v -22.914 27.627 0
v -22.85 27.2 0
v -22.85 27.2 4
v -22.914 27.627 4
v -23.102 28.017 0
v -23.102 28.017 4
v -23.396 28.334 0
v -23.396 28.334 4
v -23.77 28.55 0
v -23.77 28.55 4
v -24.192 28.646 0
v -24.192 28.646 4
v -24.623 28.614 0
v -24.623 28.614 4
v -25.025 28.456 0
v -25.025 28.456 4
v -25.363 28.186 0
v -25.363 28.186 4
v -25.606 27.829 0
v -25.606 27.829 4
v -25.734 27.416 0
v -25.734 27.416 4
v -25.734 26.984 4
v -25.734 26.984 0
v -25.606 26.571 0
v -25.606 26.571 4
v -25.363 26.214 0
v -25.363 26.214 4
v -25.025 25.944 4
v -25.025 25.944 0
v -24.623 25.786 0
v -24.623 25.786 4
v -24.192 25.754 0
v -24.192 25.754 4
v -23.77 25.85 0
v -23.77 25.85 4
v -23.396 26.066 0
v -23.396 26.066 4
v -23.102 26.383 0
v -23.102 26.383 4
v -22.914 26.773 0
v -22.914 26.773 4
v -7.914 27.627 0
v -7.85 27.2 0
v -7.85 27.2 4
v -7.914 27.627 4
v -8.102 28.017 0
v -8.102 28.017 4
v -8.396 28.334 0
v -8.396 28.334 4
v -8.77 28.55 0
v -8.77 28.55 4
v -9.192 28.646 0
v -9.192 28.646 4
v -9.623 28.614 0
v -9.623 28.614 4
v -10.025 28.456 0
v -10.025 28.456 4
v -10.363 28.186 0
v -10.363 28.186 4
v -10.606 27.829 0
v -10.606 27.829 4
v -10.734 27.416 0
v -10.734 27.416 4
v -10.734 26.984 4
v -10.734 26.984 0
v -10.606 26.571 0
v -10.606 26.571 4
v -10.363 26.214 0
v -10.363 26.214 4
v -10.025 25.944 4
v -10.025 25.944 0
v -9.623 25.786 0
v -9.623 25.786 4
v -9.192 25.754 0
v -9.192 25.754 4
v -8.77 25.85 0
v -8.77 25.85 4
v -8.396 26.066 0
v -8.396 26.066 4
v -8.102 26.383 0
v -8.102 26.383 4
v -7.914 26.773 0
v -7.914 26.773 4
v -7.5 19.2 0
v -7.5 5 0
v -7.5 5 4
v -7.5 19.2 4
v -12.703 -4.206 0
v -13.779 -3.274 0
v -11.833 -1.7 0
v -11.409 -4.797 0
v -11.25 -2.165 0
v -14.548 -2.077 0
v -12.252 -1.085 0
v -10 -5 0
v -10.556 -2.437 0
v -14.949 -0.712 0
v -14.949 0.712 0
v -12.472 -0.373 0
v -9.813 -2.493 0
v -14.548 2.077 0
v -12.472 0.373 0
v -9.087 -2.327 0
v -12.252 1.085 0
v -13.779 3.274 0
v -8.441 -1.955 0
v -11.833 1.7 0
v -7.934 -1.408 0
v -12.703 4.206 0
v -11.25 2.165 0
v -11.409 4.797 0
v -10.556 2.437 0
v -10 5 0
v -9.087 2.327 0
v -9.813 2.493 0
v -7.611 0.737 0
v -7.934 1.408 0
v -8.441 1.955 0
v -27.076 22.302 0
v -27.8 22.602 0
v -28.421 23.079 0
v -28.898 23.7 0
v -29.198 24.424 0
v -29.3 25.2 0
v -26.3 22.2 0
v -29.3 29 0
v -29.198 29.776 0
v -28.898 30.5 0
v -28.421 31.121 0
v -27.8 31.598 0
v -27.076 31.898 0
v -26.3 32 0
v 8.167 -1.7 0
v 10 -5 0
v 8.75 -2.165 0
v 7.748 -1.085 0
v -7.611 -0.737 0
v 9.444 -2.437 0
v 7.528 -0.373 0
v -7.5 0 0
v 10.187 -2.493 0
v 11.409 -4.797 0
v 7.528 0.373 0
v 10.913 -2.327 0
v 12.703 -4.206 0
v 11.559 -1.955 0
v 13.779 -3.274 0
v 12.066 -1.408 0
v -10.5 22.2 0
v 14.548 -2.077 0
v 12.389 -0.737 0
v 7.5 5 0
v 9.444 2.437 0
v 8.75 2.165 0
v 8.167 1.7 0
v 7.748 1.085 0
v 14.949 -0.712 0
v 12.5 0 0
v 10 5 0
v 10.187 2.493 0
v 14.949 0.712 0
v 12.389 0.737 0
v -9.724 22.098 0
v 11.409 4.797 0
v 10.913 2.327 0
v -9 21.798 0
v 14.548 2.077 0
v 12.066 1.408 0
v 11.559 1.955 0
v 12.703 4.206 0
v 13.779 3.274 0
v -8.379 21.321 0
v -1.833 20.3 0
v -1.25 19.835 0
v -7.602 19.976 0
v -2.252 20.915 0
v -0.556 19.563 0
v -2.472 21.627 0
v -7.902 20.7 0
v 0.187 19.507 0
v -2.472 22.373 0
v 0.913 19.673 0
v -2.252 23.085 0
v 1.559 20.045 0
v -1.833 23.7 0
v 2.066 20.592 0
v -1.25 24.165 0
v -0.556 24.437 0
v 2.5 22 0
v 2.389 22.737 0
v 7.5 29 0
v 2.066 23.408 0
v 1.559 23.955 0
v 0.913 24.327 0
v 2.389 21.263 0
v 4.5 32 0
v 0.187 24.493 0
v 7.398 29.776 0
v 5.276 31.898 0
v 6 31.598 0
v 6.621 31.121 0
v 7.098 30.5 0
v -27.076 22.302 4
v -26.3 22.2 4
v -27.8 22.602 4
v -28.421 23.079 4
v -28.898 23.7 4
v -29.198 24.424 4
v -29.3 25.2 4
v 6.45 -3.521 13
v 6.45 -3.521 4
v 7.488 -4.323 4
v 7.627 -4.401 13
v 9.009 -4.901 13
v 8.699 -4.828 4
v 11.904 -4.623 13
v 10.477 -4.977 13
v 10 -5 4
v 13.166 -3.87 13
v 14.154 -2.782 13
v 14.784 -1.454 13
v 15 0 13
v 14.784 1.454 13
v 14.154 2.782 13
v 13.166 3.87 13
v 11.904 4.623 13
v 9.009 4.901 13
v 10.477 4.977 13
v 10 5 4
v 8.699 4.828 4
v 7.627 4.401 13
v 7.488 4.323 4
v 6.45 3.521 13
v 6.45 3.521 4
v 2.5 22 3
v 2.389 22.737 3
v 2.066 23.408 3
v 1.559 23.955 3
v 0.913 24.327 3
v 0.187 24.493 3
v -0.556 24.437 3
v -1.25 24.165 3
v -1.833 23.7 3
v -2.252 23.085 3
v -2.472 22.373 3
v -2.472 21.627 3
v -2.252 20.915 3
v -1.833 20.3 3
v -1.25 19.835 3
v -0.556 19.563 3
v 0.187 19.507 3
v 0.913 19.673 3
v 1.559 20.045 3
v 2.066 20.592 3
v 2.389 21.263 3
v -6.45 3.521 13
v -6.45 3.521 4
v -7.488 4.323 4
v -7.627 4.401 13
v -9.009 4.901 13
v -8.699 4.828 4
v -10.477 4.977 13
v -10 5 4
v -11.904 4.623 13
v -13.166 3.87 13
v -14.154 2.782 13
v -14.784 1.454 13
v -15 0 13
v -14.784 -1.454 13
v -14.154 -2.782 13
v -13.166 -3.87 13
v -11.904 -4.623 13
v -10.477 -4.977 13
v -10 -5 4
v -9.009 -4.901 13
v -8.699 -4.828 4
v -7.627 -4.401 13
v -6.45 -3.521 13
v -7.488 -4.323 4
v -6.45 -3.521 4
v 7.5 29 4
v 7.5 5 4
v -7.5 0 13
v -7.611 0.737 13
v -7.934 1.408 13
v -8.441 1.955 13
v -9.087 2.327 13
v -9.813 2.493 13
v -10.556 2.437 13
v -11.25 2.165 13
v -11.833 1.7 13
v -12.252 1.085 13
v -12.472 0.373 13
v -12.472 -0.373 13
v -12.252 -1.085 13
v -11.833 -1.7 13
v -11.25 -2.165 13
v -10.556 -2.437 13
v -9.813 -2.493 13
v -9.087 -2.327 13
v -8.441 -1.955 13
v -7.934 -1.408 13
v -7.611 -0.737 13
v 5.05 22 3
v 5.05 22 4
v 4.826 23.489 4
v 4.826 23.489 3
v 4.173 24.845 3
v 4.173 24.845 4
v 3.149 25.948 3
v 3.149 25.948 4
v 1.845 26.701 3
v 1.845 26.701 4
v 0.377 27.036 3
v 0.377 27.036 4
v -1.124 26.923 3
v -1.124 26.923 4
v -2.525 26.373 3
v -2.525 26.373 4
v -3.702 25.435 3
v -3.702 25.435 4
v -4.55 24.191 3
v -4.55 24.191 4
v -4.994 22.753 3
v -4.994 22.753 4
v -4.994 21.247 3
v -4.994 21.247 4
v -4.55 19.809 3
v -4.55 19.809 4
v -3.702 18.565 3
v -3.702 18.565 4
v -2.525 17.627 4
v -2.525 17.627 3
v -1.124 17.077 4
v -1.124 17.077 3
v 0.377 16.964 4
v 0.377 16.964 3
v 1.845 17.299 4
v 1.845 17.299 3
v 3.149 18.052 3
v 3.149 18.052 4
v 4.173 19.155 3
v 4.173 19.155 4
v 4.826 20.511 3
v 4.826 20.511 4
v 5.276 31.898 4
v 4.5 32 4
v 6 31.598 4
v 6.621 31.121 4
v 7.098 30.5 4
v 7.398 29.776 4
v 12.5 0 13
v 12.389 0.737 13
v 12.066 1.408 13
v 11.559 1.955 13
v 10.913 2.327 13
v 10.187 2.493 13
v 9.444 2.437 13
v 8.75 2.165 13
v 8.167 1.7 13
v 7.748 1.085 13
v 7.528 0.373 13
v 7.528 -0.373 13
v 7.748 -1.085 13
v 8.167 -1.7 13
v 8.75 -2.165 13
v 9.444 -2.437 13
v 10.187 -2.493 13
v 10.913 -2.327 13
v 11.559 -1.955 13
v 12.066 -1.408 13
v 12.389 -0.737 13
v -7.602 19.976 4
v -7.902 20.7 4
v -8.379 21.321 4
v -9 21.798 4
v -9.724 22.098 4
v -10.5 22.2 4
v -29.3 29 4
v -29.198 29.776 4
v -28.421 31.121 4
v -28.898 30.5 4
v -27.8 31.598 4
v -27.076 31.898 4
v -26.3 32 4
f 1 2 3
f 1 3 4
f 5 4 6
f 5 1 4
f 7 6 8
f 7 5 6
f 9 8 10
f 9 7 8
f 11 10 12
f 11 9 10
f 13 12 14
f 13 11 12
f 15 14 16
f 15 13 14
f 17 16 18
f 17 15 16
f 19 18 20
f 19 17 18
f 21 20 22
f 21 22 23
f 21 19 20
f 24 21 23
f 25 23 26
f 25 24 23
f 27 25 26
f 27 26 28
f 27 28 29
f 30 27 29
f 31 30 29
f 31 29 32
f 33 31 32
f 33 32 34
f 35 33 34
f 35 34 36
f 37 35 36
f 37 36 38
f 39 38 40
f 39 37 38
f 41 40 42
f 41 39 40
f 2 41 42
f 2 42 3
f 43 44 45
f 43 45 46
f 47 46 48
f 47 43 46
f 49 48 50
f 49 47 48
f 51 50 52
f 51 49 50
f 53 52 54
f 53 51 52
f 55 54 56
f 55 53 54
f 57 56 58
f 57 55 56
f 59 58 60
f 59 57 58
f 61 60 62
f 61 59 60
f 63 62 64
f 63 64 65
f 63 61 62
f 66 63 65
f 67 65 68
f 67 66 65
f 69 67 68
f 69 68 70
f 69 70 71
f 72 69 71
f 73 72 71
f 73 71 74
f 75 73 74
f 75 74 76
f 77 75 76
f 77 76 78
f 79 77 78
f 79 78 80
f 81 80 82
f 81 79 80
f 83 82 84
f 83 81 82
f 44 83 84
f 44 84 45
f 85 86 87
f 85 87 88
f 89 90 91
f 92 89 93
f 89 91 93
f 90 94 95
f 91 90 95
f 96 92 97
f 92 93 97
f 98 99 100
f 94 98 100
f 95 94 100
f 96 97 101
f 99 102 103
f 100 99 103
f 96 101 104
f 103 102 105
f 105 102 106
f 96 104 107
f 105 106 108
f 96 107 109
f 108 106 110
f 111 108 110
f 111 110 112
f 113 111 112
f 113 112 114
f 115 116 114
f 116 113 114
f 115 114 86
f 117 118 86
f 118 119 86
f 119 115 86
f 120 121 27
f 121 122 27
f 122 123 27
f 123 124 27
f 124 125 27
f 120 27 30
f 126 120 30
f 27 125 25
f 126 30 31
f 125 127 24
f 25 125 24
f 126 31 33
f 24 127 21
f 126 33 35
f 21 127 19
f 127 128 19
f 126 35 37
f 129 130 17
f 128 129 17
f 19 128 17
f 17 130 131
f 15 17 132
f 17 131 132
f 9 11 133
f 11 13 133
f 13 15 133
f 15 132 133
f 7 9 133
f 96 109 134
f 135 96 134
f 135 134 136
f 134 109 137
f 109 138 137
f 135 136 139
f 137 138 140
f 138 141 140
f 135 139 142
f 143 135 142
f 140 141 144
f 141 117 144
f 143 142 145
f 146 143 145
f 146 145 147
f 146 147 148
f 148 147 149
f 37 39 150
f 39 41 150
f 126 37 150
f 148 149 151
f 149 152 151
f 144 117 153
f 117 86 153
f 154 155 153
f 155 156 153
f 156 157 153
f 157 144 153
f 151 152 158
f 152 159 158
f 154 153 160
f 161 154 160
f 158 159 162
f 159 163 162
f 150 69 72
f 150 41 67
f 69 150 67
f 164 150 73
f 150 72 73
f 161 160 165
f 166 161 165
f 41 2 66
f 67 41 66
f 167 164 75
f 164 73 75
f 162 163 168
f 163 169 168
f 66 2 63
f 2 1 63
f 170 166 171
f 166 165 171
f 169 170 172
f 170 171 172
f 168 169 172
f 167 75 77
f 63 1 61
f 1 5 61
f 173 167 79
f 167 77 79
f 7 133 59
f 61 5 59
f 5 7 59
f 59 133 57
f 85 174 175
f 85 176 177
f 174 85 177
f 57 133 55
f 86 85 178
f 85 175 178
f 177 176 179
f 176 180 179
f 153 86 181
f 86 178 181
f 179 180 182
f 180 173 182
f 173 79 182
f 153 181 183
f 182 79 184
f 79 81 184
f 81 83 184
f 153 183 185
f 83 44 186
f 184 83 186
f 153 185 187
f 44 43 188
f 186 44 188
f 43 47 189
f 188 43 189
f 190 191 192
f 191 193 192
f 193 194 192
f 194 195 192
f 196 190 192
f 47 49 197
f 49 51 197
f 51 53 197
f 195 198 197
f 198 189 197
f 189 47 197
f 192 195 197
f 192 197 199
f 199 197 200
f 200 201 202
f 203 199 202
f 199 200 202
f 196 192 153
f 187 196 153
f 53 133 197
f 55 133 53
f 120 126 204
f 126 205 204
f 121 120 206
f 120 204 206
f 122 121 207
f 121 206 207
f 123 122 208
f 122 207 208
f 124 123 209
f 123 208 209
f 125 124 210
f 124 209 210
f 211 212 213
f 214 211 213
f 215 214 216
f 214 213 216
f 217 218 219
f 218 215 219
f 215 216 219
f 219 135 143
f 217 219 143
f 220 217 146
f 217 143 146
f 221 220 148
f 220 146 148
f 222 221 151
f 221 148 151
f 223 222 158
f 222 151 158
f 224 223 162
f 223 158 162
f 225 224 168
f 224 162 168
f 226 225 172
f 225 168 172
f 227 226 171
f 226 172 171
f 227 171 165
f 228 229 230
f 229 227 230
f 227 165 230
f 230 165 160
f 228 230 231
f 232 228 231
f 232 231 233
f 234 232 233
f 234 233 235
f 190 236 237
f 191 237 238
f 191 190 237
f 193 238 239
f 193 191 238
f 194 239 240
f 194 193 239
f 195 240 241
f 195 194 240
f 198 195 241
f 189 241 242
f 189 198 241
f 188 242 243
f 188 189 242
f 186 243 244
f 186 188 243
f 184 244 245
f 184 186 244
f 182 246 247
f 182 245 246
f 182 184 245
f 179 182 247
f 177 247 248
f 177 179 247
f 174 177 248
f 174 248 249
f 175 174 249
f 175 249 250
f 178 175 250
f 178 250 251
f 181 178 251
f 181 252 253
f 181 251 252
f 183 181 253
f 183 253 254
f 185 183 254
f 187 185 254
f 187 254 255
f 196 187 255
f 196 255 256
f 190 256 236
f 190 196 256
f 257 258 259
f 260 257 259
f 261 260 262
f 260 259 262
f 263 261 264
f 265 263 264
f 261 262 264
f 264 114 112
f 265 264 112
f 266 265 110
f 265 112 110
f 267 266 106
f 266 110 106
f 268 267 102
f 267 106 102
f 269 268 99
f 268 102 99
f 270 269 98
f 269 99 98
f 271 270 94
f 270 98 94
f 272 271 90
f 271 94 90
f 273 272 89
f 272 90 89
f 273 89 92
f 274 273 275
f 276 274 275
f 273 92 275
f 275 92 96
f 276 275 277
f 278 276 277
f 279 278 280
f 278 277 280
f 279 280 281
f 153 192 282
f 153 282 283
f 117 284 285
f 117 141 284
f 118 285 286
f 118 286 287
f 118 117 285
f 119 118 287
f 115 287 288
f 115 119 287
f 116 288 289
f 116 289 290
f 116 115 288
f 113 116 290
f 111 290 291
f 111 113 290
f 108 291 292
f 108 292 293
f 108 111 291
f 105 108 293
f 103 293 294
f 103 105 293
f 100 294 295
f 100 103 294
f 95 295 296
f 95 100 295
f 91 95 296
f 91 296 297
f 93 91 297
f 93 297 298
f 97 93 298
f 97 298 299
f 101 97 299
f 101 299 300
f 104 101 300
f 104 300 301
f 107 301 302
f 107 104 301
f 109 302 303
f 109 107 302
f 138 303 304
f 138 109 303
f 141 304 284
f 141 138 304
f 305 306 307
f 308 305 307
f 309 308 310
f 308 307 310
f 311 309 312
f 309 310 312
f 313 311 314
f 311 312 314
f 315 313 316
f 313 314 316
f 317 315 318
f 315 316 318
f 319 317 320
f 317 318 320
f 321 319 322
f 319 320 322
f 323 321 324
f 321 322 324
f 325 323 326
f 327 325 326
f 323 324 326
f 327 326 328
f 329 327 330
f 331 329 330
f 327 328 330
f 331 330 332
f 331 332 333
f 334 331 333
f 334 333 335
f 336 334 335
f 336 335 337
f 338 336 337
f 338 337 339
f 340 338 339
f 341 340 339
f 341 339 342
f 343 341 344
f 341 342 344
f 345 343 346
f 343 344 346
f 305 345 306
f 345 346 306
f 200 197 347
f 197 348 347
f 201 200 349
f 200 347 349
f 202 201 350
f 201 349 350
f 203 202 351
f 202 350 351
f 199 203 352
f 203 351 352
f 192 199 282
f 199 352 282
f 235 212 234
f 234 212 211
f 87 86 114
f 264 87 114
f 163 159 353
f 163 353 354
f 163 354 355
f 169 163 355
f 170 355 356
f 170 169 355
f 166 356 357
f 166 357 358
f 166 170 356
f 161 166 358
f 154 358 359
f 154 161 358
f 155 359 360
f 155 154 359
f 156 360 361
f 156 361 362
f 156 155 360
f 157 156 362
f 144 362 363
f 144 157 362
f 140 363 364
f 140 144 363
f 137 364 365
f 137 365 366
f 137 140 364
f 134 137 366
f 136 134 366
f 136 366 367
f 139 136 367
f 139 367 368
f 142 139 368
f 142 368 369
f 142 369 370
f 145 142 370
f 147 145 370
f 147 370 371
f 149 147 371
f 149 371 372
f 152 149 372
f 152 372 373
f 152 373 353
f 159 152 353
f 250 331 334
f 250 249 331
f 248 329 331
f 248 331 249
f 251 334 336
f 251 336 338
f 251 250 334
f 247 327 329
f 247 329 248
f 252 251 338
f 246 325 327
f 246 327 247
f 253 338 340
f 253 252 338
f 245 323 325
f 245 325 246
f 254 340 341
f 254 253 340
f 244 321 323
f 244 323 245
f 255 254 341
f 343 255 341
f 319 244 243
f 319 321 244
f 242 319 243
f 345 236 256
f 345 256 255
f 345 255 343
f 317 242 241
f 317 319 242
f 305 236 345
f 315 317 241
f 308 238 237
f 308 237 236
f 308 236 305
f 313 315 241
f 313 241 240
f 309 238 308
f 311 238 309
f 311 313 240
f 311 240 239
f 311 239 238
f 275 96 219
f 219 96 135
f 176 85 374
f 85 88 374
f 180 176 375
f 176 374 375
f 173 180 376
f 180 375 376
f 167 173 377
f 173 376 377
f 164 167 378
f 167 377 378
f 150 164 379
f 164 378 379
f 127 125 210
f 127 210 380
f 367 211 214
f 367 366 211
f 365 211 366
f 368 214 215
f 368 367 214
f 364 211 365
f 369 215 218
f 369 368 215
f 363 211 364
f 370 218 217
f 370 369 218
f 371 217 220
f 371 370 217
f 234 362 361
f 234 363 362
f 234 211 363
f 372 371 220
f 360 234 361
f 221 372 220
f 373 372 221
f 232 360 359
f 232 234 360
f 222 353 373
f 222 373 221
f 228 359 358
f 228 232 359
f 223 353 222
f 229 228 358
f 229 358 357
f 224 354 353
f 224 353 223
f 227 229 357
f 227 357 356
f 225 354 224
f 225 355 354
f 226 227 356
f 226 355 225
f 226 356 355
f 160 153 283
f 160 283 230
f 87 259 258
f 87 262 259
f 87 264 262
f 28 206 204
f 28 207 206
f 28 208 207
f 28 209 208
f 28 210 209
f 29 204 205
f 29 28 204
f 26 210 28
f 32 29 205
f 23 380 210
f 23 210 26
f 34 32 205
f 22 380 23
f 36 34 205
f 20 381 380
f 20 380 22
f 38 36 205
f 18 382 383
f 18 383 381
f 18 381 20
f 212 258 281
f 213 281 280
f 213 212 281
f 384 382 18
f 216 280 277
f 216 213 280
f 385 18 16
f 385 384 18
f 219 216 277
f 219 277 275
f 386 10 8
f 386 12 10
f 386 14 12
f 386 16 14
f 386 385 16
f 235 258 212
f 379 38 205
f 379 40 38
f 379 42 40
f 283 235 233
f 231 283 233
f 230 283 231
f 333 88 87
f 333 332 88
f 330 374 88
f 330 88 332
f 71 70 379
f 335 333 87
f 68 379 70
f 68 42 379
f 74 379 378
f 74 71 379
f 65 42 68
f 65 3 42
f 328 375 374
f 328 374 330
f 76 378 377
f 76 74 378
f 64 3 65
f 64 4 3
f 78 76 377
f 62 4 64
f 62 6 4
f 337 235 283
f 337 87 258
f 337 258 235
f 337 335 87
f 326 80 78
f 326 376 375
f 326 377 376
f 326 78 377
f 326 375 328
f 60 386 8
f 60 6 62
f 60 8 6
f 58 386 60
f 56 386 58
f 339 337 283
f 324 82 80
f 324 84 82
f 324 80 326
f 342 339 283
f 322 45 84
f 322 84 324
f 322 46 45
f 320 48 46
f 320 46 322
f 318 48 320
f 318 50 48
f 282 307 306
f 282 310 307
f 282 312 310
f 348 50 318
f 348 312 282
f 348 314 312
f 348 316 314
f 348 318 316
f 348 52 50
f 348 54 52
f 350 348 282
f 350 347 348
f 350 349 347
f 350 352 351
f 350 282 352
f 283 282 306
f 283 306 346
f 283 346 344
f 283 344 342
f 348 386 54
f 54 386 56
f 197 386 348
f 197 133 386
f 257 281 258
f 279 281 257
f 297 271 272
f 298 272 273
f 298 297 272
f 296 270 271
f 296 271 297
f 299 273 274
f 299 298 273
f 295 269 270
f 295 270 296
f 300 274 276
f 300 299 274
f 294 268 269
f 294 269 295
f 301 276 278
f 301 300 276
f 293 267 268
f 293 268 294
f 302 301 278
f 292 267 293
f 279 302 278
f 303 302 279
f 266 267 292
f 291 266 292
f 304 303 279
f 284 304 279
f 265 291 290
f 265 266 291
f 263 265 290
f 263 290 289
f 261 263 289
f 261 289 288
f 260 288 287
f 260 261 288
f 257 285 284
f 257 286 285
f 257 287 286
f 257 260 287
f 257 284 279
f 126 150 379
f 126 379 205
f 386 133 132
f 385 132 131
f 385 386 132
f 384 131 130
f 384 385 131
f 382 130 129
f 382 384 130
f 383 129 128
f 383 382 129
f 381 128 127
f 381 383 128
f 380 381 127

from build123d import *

# Parameters (mm, degrees)
SKETCH_R          = 2.5
SKETCH_R_2        = 1.45
PAD_DEPTH         = 4
SKETCH003_R       = 5
SKETCH003_R_2     = 2.5
PAD001_DEPTH      = 9
SKETCH002_W       = 12.9
SKETCH002_H       = 16.151024
POCKET_DEPTH      = 32.001
POCKET_DEPTH_BACK = 5.001
FILLET_R          = 3
SKETCH004_R       = 5.05
POCKET001_DEPTH   = 1


with BuildPart() as part:
    # Sketch → Pad (new body)
    with BuildSketch(Plane.XY):
        with BuildLine():
            Line((-10, -5), (10, -5))
            ThreePointArc((10, -5), (15, 0), (10, 5))
            Line((7.5, 5), (10, 5))
            Line((7.5, 32), (7.5, 5))
            Line((-7.5, 32), (7.5, 32))
            Line((-29.3, 32), (-7.5, 32))
            Line((-29.3, 22.2), (-29.3, 32))
            Line((-7.5, 22.2), (-29.3, 22.2))
            Line((-7.5, 5), (-7.5, 22.2))
            Line((-7.5, 5), (-10.000009, 5))
            ThreePointArc((-10.000009, 5), (-15, -4e-06), (-10, -5))
        make_face()
        with Locations((-10, 0)):
            Circle(SKETCH_R, mode=Mode.SUBTRACT)
        with Locations((10, 0)):
            Circle(SKETCH_R, mode=Mode.SUBTRACT)
        with Locations((0, 22)):
            Circle(SKETCH_R, mode=Mode.SUBTRACT)
        with Locations((-9.3, 27.2)):
            Circle(SKETCH_R_2, mode=Mode.SUBTRACT)
        with Locations((-24.3, 27.2)):
            Circle(SKETCH_R_2, mode=Mode.SUBTRACT)
    extrude(amount=PAD_DEPTH)

    # Sketch003 (on DatumPlane) → Pad001 (join)
    with BuildSketch(Plane.XY.offset(4)):
        with Locations((-10, 0)):
            Circle(SKETCH003_R)
        with Locations((-10, 0)):
            Circle(SKETCH003_R_2, mode=Mode.SUBTRACT)
        with Locations((10, 0)):
            Circle(SKETCH003_R)
        with Locations((10, 0)):
            Circle(SKETCH003_R_2, mode=Mode.SUBTRACT)
    extrude(amount=PAD001_DEPTH)

    # Sketch002 → Pocket (cut, two sides)
    with BuildSketch(Plane.XZ) as pocket_sk:
        with Locations((0, 12.075512)):
            Rectangle(SKETCH002_W, SKETCH002_H)
    extrude(amount=-POCKET_DEPTH, mode=Mode.SUBTRACT)
    extrude(pocket_sk.sketch, amount=POCKET_DEPTH_BACK, mode=Mode.SUBTRACT)

    # Fillet
    fillet_edges = [part.edges().sort_by_distance(p)[0] for p in [
        (-29.3, 22.2, 2),
        (-29.3, 32, 2),
        (-7.5, 22.2, 2),
        (7.5, 32, 2),
    ]]
    fillet(fillet_edges, radius=FILLET_R)

    # Sketch004 (on Face5 of Fillet) → Pocket001 (cut)
    with BuildSketch(Plane.XY.offset(4)):
        with Locations((0, 22)):
            Circle(SKETCH004_R)
    extrude(amount=-POCKET001_DEPTH, mode=Mode.SUBTRACT)


solid = part.part
